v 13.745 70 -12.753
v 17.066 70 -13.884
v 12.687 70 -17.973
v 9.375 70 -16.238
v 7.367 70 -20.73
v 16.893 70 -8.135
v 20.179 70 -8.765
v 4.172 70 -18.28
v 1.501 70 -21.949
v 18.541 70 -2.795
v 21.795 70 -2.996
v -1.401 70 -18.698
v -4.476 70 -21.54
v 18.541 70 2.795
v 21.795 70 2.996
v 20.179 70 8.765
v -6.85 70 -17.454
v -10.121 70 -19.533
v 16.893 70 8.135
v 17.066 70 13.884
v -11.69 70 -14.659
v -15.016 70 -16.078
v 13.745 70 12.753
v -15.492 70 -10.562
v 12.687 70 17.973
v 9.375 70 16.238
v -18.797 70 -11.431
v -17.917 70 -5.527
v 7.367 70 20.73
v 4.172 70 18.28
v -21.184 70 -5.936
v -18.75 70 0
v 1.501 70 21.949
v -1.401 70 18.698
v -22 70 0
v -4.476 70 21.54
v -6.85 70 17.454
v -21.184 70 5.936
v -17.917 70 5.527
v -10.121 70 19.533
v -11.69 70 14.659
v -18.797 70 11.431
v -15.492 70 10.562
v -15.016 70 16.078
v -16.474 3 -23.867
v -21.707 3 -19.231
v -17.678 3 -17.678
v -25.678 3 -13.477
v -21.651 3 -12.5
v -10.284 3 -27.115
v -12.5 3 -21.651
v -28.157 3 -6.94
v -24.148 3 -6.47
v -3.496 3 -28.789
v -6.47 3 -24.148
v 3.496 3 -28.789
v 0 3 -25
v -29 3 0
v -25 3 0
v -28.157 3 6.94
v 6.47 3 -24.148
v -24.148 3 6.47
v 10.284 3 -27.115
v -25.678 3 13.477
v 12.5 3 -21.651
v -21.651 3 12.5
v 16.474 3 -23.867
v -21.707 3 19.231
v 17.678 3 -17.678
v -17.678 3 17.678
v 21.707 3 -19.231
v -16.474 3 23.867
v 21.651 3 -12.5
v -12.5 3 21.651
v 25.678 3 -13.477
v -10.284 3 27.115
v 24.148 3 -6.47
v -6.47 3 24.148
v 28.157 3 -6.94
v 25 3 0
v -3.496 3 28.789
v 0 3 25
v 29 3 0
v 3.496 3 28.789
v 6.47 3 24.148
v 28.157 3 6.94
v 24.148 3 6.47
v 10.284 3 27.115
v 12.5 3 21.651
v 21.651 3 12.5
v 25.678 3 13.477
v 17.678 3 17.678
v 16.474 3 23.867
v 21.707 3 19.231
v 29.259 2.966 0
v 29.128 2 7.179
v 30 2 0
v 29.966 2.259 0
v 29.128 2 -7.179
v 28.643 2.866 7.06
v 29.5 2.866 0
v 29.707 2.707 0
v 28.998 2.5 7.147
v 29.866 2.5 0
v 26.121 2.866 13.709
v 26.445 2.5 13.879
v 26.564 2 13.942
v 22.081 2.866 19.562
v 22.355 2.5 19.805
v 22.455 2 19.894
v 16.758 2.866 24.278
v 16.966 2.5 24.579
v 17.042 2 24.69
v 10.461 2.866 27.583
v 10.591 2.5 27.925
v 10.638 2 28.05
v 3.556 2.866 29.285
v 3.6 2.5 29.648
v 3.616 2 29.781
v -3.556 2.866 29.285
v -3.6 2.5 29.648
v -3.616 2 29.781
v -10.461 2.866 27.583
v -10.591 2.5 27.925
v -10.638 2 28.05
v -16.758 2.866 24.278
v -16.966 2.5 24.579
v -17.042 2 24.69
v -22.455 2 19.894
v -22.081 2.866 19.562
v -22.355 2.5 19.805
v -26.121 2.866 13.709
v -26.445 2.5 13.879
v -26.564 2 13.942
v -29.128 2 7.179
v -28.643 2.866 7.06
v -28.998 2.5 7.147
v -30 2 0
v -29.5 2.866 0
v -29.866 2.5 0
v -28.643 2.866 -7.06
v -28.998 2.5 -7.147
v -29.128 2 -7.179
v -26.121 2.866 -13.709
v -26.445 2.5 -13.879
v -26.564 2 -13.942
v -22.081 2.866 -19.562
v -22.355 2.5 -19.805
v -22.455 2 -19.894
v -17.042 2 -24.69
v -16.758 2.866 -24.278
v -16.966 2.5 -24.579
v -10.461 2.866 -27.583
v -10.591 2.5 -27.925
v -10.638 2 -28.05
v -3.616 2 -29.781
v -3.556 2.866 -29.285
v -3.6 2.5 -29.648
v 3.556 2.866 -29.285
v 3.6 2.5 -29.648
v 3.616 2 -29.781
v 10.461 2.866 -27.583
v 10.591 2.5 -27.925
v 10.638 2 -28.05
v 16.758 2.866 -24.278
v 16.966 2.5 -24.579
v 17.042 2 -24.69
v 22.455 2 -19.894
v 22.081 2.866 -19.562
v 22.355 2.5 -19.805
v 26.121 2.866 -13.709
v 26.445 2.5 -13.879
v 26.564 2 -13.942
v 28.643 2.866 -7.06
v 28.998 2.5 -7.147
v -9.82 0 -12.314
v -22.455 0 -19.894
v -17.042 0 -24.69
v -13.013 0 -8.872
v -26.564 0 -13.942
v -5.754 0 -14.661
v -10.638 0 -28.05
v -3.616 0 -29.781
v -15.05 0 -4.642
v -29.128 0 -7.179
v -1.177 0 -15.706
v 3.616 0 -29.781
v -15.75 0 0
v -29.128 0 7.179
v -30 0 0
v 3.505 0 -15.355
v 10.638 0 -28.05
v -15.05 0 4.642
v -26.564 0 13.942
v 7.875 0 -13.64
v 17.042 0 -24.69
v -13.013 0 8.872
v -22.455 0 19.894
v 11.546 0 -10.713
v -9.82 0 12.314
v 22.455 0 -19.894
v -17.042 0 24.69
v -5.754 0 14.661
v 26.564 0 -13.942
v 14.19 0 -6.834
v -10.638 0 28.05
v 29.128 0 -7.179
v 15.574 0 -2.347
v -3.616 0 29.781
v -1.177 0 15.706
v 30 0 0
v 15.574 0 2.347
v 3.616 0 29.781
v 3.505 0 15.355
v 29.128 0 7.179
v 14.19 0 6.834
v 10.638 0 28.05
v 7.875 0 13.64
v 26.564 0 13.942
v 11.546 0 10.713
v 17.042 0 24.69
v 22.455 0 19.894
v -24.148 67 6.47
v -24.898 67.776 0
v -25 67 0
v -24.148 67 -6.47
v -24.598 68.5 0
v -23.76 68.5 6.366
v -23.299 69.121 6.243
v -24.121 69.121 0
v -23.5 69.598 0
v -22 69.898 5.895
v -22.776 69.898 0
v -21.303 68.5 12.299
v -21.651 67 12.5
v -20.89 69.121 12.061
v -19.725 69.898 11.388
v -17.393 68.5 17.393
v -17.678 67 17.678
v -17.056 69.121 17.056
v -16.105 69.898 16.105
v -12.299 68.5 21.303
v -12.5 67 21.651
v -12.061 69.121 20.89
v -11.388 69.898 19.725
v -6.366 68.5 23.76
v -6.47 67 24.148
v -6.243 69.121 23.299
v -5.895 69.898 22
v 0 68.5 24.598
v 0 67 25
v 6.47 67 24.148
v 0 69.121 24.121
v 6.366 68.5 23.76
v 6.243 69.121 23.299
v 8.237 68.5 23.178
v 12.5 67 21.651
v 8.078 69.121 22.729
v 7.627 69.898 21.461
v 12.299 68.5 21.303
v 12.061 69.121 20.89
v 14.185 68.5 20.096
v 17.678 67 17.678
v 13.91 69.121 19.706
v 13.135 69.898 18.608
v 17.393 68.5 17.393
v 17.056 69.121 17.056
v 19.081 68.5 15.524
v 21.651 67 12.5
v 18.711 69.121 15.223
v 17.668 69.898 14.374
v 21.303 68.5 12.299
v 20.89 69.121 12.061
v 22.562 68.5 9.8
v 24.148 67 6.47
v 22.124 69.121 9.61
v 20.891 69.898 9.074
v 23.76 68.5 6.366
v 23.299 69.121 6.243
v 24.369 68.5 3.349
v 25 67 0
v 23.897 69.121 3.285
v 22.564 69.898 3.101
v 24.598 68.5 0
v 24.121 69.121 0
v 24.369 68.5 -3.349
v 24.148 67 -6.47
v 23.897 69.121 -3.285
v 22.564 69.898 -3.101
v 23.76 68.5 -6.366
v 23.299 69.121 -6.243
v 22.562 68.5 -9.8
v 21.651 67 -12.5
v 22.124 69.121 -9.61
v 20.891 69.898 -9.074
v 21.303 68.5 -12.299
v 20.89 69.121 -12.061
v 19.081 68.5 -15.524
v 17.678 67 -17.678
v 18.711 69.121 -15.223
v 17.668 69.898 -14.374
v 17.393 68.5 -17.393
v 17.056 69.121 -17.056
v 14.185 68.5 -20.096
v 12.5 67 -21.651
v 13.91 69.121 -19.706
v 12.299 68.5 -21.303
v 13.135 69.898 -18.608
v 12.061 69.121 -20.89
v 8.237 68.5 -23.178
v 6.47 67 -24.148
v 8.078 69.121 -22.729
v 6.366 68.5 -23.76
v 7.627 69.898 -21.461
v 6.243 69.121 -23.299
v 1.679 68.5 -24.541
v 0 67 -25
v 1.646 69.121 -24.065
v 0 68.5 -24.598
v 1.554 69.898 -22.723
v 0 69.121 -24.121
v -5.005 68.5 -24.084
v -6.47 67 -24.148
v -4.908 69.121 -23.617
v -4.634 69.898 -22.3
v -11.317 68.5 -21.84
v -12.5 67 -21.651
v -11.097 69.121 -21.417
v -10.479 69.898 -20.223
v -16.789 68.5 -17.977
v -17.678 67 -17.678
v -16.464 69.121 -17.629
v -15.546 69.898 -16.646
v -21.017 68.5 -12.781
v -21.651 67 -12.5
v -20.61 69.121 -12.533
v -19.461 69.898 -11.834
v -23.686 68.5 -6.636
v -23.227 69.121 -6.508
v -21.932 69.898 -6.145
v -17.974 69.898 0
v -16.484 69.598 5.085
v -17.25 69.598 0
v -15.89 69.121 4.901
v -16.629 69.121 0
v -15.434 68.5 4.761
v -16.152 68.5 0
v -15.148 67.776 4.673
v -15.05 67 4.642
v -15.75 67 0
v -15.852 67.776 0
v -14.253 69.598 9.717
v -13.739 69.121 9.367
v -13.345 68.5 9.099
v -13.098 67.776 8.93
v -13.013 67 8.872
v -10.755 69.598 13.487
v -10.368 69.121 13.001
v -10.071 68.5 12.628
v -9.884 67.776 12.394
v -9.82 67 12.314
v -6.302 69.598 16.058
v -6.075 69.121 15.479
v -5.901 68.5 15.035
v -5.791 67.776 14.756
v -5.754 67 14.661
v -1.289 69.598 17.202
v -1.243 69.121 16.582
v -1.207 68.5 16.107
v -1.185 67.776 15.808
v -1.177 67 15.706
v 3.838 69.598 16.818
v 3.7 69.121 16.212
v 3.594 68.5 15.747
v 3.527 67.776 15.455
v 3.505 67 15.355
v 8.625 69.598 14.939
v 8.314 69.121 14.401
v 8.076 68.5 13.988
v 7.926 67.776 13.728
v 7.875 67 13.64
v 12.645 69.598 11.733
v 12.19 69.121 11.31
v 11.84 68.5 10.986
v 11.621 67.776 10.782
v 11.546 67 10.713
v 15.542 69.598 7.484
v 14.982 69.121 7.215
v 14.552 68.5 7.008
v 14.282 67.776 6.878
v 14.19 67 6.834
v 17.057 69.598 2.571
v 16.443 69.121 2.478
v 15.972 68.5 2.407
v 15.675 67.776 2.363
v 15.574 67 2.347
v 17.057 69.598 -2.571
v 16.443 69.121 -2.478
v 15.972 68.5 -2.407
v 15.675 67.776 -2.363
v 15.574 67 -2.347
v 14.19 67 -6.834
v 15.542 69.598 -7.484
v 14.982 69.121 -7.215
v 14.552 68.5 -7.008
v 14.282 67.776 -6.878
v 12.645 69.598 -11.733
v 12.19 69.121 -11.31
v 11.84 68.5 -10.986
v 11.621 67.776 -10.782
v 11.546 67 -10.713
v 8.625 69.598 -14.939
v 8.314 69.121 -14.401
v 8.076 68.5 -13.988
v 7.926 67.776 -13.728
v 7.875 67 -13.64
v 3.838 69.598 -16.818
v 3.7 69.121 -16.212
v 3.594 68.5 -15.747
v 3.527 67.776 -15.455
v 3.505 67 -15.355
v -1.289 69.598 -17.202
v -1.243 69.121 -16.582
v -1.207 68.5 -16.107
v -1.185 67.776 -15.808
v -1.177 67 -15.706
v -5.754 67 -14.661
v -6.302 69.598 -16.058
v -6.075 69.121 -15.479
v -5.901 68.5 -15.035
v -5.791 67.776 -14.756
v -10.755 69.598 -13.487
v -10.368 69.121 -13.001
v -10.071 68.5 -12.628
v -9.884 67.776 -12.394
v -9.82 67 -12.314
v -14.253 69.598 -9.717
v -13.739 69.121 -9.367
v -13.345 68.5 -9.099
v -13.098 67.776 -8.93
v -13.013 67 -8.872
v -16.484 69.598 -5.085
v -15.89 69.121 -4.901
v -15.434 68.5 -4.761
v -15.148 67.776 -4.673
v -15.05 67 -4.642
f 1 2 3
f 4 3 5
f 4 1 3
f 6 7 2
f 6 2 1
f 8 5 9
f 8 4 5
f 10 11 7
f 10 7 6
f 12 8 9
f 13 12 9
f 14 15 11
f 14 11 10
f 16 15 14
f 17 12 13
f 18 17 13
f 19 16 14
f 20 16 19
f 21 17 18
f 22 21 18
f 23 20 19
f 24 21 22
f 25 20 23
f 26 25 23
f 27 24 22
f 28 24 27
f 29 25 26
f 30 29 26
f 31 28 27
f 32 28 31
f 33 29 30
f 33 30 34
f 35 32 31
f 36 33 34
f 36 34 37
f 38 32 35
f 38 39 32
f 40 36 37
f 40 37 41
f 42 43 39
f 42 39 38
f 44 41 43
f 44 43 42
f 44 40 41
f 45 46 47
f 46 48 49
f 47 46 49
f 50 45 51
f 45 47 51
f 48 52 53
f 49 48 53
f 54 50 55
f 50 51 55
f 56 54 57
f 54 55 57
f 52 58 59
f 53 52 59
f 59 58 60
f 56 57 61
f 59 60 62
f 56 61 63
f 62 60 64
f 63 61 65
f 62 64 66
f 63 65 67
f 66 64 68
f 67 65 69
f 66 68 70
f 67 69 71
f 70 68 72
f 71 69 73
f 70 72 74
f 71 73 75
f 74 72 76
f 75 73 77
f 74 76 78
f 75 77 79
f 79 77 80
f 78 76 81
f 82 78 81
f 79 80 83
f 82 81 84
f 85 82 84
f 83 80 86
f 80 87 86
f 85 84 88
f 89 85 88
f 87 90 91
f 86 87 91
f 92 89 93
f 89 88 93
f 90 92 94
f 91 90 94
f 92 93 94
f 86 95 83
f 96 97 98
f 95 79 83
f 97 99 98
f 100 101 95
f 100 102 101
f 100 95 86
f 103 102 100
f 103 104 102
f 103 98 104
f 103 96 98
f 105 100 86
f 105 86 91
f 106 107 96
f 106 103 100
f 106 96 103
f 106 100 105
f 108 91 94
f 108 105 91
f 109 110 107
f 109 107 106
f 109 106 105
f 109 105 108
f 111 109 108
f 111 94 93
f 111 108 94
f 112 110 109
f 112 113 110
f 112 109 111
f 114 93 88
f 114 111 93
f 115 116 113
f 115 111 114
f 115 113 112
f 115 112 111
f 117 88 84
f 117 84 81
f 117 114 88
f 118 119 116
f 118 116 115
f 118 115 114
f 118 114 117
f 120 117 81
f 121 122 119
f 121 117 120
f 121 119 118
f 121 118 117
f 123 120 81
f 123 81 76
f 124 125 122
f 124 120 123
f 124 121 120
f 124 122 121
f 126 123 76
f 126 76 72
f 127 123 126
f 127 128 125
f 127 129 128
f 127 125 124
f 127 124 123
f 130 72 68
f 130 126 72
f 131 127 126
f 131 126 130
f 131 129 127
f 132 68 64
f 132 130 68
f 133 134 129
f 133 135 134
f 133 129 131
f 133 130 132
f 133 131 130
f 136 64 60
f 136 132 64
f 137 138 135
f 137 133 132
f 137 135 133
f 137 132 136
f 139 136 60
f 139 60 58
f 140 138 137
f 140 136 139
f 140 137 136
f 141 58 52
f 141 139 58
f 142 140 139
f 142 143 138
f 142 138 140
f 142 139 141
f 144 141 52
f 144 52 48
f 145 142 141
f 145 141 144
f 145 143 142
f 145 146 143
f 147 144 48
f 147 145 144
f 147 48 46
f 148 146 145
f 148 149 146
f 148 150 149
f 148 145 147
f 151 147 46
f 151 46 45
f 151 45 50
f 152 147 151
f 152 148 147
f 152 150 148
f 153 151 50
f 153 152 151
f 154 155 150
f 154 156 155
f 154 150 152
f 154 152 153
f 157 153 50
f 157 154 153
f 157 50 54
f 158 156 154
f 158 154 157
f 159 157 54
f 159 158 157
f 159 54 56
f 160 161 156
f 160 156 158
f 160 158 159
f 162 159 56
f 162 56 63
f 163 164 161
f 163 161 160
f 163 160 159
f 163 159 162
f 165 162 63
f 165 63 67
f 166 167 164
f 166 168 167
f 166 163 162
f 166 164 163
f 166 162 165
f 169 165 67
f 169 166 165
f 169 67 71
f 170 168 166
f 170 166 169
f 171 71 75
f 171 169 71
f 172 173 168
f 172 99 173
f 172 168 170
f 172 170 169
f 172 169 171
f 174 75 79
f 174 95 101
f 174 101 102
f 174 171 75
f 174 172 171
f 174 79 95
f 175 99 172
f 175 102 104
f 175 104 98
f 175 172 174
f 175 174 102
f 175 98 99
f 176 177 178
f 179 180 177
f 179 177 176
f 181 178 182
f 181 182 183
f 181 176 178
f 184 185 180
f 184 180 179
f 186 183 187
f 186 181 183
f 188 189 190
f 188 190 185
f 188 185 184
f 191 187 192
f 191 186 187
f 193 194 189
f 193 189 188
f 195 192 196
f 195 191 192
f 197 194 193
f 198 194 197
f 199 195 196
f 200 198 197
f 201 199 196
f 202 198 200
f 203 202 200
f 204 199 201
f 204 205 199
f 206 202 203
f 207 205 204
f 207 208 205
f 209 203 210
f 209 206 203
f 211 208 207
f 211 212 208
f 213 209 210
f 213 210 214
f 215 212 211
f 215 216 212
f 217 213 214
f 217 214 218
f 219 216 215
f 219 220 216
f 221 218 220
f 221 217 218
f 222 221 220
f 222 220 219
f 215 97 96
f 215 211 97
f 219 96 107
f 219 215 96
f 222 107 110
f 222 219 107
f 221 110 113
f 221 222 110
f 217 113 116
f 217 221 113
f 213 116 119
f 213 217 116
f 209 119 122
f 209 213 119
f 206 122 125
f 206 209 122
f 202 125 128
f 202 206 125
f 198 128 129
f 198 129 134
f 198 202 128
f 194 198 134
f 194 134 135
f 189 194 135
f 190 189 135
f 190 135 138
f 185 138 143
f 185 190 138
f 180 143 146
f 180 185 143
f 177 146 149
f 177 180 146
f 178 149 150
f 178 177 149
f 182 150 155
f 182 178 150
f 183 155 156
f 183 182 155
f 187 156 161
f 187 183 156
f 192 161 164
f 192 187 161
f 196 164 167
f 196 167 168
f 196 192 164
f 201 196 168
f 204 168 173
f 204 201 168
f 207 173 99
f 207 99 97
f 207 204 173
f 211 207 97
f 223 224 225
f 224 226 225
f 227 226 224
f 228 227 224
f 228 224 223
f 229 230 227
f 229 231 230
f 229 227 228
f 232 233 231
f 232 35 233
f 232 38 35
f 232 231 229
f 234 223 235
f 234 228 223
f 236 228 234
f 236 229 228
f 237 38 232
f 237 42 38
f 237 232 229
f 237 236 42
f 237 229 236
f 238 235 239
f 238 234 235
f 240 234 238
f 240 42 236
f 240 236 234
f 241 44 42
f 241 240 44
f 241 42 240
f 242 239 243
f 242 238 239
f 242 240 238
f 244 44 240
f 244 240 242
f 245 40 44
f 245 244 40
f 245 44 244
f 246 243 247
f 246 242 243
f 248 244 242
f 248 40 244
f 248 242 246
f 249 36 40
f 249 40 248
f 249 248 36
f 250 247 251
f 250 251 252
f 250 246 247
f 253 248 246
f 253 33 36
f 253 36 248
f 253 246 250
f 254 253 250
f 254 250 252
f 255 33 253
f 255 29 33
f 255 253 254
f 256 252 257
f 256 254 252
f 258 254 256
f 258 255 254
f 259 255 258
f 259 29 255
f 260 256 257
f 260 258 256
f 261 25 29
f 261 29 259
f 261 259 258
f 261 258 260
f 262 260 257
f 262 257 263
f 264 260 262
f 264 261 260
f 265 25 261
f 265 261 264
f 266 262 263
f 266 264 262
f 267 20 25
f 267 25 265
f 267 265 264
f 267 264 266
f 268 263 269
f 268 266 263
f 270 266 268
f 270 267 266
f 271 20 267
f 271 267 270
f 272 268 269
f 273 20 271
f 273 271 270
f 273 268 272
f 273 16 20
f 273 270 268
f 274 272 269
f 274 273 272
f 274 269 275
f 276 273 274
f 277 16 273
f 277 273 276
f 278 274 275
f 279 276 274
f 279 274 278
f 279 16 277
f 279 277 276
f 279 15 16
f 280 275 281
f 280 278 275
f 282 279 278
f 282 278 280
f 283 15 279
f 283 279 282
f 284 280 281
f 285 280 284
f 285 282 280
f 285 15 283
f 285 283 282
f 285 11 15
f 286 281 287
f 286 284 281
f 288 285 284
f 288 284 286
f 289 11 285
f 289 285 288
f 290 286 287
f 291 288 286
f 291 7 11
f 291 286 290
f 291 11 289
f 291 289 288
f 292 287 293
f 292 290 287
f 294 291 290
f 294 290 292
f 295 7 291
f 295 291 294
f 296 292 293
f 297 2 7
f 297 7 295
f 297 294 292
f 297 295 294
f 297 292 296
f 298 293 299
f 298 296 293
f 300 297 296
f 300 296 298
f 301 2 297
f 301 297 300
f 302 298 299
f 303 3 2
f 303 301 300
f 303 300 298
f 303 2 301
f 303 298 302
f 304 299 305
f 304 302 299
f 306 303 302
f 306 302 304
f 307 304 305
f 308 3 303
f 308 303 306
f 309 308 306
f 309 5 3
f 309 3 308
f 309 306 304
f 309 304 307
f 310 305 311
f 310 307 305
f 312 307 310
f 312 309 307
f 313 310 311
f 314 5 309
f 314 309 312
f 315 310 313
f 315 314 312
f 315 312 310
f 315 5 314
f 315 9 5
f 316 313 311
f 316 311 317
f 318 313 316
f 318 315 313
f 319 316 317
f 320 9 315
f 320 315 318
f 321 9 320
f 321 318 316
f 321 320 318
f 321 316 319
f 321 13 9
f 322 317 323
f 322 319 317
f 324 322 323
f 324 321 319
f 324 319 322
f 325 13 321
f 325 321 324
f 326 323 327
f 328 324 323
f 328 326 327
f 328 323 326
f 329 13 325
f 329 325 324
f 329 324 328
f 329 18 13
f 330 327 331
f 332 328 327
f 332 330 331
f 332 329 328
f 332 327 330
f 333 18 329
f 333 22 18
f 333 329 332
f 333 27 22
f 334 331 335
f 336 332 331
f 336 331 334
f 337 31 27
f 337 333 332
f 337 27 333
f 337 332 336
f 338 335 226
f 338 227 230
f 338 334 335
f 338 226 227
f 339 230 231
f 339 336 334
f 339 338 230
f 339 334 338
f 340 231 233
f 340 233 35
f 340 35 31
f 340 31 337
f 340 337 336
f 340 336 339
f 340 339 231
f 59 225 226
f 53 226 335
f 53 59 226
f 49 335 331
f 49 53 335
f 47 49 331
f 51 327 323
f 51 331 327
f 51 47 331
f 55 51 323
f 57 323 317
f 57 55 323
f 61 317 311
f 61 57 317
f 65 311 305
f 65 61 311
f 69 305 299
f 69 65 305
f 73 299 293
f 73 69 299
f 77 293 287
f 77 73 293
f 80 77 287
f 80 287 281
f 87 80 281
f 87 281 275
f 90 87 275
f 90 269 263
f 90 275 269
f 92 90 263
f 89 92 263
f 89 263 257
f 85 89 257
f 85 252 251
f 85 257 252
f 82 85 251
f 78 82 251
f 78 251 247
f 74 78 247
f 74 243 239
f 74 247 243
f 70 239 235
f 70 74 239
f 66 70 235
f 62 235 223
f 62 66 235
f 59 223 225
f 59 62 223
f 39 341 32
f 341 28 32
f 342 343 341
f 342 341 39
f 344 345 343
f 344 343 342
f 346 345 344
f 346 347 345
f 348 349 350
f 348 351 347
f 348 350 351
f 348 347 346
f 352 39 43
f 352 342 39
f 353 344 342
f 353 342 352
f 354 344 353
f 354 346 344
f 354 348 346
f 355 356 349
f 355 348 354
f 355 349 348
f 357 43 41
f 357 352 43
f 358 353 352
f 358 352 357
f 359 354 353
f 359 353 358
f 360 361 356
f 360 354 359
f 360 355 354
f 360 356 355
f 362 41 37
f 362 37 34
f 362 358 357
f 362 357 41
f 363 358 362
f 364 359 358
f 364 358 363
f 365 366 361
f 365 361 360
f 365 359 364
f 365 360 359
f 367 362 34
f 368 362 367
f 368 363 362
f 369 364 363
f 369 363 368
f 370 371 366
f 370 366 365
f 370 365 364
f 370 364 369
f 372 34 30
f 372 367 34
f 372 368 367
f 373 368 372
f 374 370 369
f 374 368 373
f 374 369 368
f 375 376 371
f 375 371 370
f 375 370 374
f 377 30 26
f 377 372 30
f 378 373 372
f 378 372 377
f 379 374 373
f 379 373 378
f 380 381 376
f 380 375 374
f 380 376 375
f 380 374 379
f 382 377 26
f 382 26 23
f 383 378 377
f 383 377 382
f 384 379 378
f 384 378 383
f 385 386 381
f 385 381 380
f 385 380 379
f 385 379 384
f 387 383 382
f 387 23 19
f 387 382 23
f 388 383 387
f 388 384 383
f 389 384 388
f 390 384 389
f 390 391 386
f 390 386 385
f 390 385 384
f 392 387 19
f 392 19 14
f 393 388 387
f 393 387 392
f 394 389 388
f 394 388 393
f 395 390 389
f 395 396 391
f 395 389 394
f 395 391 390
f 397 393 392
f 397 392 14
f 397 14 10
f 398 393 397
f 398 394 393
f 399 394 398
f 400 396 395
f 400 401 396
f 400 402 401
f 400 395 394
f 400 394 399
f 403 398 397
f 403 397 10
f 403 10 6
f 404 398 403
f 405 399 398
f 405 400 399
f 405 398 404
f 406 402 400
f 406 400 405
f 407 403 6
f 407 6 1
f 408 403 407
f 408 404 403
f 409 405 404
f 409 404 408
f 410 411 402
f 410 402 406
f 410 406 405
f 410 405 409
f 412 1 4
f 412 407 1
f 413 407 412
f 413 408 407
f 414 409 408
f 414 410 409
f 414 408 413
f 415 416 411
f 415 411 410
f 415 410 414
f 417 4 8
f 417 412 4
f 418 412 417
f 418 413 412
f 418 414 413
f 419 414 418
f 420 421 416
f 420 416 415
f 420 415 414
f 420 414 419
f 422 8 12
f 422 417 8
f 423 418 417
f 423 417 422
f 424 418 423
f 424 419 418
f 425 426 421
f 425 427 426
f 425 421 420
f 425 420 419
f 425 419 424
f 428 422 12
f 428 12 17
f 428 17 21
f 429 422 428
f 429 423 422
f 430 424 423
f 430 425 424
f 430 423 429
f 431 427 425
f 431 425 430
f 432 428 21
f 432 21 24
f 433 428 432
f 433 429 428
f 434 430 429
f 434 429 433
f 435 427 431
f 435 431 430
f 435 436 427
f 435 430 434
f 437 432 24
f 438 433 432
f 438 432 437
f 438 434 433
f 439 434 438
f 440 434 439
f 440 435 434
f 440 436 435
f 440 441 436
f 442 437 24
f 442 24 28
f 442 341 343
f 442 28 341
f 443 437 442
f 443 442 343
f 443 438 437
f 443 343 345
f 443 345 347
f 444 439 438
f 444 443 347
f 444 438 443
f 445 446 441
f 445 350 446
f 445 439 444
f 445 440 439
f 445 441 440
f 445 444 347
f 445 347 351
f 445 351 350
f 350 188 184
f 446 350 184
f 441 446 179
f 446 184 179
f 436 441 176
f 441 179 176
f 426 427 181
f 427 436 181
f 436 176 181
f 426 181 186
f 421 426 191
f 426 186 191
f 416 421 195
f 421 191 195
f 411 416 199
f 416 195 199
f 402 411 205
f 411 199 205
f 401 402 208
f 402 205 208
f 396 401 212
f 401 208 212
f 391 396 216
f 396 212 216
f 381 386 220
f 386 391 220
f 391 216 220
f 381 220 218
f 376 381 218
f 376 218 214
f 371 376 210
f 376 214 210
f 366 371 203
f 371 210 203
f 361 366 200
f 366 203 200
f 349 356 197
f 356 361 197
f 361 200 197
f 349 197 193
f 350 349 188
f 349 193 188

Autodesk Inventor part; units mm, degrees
ref_plane "YZ Plane" through (0, 0, 0) normal (1, 0, 0) x (0, 1, 0)
ref_plane "XZ Plane" through (0, 0, 0) normal (0, 1, 0) x (-1, 0, 0)
ref_plane "XY Plane" through (0, 0, 0) normal (0, 0, 1) x (1, 0, 0)
sketch "Sketch1" plane through (0, 0, 0) normal (0, 1, 0) x (-1, 0, 0)
  circle A0 centre (0, 0) radius 15.75
  circle A1 centre (0, 0) radius 25
  dimension "d0" = 31.5
  dimension "d1" = 50
extrude "Extrusion1" add sketch "Sketch1" along normal blind 70
sketch "Sketch2" plane through (0, 0, 0) normal (0, -1, 0) x (1, 0, 0)
  circle A0 centre (0, 0) radius 25 projected
  circle A1 centre (0, 0) radius 30
  dimension "d4" = 5
extrude "Extrusion2" add sketch "Sketch2" against normal blind 3
fillet "Fillet1" radius 1 1 edges at (-30, 3, 0)
fillet "Fillet2" radius 3 2 edges at (15.75, 70, 0) (25, 70, 0)
properties part number "Adaptador rollo 5cm"
